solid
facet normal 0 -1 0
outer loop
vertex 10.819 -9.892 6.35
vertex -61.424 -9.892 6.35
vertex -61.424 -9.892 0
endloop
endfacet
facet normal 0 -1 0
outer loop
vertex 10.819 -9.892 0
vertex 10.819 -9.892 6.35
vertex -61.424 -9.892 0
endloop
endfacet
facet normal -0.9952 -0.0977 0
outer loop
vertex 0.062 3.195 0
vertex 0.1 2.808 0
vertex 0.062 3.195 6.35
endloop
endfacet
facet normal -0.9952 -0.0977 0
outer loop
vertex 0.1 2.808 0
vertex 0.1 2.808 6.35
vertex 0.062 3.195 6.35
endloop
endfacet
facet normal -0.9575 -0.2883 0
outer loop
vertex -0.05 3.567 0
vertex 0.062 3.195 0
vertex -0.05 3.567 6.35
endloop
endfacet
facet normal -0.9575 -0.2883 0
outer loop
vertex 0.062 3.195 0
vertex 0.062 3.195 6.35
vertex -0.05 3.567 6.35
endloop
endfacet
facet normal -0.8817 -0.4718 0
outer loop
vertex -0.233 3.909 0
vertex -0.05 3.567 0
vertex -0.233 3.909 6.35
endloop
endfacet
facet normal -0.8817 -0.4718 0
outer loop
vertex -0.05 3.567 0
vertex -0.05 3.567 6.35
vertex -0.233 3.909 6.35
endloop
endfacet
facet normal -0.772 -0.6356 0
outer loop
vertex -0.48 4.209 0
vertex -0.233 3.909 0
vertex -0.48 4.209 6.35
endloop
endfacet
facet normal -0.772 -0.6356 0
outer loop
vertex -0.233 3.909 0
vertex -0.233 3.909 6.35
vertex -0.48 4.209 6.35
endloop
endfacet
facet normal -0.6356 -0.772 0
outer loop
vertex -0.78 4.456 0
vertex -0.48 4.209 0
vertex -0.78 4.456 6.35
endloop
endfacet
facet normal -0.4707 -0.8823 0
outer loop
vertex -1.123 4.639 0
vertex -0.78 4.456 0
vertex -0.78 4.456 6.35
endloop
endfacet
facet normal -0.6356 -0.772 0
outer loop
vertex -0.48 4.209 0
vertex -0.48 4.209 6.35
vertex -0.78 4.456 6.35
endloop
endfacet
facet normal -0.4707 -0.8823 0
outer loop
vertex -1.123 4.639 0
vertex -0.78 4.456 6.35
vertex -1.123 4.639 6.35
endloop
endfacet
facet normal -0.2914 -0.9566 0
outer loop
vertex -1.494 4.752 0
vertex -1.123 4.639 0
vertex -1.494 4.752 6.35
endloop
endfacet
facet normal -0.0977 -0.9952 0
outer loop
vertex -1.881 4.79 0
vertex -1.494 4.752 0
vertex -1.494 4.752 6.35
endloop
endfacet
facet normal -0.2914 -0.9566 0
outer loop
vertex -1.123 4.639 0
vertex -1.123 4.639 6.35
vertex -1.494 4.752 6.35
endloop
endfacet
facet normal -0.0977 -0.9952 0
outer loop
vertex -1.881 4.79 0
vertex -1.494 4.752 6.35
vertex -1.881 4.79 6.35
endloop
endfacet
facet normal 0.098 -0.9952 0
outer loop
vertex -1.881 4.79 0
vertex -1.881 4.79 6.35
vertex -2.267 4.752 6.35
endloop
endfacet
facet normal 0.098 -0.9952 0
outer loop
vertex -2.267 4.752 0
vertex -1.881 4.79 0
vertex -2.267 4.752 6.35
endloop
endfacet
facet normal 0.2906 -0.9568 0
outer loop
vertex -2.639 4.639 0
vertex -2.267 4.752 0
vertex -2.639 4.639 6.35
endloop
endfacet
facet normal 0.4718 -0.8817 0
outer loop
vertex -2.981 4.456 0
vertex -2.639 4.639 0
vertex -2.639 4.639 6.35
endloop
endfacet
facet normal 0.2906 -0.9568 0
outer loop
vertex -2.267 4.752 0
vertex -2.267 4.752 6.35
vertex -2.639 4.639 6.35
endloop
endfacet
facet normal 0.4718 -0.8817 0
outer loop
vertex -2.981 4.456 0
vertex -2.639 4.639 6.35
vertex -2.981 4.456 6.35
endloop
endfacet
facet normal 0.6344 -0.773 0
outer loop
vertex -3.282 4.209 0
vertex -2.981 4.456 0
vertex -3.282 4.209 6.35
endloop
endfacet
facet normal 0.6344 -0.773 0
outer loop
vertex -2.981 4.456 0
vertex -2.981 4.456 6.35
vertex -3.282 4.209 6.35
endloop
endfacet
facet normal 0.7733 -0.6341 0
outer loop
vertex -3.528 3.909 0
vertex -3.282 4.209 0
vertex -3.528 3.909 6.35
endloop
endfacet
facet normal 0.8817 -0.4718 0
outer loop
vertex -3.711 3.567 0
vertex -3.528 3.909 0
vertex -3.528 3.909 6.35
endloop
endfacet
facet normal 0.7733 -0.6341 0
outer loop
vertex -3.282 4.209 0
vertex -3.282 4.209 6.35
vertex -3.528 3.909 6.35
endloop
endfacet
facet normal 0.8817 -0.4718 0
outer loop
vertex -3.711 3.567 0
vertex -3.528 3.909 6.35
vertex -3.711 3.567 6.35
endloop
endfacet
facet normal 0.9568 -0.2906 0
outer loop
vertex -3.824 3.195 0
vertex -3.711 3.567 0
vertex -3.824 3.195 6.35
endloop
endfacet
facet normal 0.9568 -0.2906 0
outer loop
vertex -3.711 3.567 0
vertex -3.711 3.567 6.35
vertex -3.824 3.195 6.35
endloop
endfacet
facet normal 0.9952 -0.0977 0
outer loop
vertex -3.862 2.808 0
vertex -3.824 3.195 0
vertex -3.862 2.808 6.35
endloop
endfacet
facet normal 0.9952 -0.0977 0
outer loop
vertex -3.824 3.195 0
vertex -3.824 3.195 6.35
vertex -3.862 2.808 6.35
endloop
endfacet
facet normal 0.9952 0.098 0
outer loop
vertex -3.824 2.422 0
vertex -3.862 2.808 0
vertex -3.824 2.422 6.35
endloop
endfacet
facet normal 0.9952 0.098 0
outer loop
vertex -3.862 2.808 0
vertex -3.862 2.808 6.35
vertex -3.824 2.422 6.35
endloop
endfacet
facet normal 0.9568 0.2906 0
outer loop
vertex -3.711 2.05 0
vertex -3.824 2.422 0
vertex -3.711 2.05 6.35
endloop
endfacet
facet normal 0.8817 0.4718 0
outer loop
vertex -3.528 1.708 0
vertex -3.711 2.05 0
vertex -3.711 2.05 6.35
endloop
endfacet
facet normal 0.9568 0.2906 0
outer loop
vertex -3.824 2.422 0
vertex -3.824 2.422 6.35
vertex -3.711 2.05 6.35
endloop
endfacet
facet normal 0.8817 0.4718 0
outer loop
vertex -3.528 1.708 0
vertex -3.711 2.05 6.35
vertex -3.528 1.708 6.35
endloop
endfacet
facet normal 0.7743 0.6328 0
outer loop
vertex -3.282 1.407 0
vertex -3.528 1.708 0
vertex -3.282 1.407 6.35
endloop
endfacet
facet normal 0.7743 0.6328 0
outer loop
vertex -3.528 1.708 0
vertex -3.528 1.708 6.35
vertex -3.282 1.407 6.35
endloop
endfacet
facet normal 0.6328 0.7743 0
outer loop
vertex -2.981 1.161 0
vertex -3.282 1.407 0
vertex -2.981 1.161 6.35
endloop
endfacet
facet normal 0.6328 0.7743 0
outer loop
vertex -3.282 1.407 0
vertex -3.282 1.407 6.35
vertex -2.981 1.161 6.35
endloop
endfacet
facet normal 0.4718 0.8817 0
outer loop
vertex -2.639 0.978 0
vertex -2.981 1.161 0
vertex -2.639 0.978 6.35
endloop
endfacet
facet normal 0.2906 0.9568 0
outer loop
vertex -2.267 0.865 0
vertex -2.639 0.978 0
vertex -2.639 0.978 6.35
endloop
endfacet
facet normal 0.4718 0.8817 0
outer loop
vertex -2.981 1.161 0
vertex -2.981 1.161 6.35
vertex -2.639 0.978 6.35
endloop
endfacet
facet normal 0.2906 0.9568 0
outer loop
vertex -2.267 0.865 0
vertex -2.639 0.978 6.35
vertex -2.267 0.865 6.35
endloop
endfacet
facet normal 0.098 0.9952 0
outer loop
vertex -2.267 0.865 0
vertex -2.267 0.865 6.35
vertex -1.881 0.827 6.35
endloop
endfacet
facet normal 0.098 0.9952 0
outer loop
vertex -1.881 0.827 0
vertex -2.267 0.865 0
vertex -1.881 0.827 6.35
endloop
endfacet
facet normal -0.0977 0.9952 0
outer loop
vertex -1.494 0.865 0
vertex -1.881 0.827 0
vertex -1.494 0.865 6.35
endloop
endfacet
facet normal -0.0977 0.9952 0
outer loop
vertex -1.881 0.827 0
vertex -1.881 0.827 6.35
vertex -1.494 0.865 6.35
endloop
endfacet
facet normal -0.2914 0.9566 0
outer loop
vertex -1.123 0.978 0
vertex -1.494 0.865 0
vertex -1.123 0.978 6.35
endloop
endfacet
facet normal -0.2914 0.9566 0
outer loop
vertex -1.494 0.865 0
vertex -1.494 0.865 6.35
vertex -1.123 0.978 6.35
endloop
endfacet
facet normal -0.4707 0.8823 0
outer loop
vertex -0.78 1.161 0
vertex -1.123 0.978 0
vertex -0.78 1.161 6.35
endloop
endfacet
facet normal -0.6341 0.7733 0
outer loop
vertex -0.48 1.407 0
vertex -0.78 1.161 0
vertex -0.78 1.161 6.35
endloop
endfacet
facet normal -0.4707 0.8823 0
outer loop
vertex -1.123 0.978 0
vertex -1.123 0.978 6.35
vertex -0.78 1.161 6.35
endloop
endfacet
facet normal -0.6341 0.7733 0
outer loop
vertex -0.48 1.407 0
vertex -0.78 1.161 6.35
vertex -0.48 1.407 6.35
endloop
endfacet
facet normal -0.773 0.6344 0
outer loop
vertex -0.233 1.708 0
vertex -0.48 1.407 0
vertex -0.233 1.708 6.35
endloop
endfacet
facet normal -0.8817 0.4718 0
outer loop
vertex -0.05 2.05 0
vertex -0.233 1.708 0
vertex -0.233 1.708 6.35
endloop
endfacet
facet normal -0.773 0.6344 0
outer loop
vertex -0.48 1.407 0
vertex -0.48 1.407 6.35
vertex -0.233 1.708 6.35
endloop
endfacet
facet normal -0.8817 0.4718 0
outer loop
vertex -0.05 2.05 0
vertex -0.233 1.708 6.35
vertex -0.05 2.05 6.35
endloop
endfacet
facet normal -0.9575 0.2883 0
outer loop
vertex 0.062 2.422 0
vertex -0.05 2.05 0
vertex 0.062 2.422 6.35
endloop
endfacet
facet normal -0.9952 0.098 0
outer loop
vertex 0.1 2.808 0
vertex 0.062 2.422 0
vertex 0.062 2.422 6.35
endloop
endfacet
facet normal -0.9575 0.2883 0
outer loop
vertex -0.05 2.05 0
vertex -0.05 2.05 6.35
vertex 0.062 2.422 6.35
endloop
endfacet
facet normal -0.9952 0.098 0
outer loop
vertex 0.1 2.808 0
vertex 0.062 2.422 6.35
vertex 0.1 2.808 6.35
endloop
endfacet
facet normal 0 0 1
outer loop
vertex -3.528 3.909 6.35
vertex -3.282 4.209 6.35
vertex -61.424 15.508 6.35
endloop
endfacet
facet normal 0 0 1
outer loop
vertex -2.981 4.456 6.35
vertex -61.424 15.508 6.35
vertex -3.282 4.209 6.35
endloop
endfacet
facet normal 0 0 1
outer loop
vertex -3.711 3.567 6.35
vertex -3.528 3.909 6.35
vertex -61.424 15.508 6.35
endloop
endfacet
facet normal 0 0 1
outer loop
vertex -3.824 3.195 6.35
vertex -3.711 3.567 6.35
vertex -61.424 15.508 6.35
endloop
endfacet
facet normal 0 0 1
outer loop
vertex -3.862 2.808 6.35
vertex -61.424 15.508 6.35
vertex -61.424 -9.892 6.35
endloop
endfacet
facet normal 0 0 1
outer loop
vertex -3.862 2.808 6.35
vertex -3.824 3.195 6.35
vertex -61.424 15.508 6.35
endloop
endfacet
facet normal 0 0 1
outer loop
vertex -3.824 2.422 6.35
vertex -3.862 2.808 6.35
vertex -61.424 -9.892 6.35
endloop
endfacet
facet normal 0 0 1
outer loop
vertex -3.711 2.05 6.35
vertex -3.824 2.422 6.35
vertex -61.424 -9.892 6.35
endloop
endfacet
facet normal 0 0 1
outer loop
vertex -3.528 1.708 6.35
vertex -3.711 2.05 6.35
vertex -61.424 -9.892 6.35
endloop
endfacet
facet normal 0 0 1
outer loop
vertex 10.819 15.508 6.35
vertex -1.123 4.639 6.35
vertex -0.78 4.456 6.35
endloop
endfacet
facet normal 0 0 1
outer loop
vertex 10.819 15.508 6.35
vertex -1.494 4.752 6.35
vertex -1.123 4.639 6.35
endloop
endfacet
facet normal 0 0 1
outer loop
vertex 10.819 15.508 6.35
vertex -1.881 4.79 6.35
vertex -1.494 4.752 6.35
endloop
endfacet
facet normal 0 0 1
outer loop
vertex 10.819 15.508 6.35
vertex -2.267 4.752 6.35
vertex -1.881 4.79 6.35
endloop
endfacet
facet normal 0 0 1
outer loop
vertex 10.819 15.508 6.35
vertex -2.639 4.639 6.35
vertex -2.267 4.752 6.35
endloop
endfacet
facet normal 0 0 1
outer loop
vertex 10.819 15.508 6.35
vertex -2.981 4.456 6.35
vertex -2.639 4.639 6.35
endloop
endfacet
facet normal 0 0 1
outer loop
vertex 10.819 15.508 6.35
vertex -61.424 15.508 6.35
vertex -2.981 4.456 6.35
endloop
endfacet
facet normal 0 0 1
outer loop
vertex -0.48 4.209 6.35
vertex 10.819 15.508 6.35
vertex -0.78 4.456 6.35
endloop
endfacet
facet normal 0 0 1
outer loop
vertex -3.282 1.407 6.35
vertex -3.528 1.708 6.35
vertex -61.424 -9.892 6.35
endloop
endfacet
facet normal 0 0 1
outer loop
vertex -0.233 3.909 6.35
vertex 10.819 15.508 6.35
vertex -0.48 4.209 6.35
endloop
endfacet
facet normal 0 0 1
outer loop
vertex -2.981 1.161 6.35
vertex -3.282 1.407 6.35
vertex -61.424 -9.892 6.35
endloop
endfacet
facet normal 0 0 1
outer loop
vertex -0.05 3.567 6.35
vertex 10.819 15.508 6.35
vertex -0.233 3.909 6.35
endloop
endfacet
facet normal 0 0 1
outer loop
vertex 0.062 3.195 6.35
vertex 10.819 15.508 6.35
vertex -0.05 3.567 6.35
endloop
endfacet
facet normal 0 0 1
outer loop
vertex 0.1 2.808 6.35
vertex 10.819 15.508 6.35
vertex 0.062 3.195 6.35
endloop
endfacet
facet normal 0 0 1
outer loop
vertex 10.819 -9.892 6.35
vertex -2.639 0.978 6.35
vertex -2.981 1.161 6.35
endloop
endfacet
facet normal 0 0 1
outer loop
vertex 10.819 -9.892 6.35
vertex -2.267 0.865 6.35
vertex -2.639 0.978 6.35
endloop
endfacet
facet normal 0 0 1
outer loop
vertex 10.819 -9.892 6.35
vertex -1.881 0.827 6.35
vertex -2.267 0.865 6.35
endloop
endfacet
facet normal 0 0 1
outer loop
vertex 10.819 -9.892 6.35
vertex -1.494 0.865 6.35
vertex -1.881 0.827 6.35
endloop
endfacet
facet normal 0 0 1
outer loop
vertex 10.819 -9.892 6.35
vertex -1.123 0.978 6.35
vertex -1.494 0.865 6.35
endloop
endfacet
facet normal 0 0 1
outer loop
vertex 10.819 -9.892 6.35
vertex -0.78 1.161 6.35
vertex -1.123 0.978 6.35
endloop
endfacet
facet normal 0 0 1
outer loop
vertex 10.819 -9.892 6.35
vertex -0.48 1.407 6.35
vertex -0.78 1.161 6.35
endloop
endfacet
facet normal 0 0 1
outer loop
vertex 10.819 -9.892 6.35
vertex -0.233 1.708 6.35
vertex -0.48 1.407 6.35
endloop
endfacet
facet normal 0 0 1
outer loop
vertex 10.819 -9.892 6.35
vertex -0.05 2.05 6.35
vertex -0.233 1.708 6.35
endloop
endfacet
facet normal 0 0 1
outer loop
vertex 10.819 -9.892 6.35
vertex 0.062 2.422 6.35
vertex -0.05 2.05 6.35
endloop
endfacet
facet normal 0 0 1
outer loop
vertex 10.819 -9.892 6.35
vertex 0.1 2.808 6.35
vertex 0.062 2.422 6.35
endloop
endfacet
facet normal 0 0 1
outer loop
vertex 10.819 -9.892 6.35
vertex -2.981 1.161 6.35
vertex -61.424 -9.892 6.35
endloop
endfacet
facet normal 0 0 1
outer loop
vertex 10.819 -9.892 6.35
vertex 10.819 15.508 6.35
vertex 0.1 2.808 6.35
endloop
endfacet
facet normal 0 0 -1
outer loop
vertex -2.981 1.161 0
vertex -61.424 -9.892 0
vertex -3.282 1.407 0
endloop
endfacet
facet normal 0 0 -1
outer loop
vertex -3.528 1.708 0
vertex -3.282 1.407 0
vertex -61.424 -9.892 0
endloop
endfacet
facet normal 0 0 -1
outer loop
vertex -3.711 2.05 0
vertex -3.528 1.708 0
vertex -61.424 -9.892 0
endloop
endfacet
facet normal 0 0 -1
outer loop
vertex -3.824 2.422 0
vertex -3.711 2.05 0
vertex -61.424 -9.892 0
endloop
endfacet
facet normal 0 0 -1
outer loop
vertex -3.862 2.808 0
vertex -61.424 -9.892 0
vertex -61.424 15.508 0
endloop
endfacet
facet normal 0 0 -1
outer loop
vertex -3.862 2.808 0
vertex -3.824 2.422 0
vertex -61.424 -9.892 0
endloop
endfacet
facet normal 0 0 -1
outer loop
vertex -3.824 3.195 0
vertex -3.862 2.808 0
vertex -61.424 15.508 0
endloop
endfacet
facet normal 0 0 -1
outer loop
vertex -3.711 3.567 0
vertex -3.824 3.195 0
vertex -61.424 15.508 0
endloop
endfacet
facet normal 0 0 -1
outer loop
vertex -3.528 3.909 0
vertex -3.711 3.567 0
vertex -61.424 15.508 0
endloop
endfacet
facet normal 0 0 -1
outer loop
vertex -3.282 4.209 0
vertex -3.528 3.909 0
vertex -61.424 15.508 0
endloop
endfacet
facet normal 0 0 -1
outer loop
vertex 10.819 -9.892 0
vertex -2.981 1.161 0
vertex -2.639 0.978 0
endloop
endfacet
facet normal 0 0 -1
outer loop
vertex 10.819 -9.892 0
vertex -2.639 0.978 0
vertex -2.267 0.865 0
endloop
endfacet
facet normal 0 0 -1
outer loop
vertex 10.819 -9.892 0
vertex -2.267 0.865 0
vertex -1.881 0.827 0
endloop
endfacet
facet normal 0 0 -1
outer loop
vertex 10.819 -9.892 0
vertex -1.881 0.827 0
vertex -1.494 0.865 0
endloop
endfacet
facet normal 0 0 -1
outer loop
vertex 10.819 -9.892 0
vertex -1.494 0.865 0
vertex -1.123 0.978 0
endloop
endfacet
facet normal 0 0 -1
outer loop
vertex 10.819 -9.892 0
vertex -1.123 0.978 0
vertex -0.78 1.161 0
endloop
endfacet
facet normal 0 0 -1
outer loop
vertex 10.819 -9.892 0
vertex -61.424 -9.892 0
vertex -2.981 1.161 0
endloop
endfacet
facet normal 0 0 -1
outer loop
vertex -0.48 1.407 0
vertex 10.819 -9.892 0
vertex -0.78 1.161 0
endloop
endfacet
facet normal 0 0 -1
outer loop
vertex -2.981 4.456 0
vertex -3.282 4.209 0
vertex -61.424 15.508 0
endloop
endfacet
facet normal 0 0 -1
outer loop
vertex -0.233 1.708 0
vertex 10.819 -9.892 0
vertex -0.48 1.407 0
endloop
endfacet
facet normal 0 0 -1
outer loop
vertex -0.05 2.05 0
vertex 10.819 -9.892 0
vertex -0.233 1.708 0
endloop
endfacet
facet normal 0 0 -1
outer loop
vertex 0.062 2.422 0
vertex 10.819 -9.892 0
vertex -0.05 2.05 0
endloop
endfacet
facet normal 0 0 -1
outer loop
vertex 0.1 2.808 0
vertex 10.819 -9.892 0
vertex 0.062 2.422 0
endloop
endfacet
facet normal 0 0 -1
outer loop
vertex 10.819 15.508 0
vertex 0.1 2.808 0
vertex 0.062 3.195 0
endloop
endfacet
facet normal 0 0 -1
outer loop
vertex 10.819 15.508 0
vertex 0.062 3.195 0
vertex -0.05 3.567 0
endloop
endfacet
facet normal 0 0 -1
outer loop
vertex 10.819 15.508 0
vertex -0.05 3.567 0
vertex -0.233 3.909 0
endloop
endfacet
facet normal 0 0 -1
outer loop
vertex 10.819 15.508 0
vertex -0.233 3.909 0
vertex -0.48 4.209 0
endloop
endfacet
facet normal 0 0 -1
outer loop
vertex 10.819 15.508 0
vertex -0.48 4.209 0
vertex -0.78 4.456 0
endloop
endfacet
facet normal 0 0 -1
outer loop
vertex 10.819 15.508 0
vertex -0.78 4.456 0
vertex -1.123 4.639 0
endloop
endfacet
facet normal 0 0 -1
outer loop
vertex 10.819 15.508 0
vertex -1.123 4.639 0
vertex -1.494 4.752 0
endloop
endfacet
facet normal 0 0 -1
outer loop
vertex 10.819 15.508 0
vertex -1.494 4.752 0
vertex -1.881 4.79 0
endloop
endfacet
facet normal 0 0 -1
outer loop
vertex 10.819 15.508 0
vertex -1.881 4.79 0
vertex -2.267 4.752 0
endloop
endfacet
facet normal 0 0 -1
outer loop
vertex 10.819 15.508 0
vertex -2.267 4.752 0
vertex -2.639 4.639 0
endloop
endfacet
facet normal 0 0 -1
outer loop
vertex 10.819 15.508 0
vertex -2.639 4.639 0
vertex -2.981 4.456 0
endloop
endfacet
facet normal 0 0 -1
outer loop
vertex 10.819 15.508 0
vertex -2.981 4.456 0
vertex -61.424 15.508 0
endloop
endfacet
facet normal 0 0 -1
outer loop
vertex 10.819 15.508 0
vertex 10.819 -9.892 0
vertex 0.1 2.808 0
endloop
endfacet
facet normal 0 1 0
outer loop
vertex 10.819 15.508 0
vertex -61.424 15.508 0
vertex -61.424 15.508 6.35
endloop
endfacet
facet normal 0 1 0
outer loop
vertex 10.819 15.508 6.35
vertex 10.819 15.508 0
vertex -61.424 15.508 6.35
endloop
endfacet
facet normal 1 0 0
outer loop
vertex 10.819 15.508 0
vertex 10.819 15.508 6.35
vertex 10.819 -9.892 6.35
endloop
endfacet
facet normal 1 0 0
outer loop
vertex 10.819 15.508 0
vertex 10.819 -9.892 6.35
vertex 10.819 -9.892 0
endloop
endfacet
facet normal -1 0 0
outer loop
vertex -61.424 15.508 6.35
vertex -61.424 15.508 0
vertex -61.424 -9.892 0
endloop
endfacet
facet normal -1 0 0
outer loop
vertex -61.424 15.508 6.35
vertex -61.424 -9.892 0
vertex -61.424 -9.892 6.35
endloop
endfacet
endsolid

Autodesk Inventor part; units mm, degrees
ref_plane "YZ Plane" through (0, 0, 0) normal (1, 0, 0) x (0, 1, 0)
ref_plane "XZ Plane" through (0, 0, 0) normal (0, 1, 0) x (-1, 0, 0)
ref_plane "XY Plane" through (0, 0, 0) normal (0, 0, 1) x (1, 0, 0)
sketch "Sketch1" plane through (0, 0, 0) normal (0, 0, 1) x (1, 0, 0)
  line L0 (-53.9057, 15.5084) -> (-1.8807, 15.5084)
  line L1 (-1.8807, 15.5084) -> (-1.8807, -9.8916)
  line L2 (-1.8807, -9.8916) -> (-53.9057, -9.8916)
  line L3 (-53.9057, -9.8916) -> (-53.9057, 15.5084)
  point P0 (0, 0)
  dimension "d0" = 52.025
  dimension "d1" = 25.4
extrude "Extrusion1" add sketch "Sketch1" along normal blind 6.35
sketch "Sketch2" plane through (-1.8807, -9.8916, 0) normal (1, 0, 0) x (0, 0, -1)
  line L0 (-6.35, 25.4) -> (-6.35, 0) projected
  line L1 (0, 0) -> (-6.35, 0) projected
  line L2 (0, 25.4) -> (0, 0) projected
  line L3 (0, 25.4) -> (-6.35, 25.4) projected
  point P0 (0, 9.8916)
extrude "Extrusion2" add sketch "Sketch2" along normal blind 12.7
sketch "Sketch3" plane through (0, 0, 6.35) normal (0, 0, 1) x (1, 0, 0)
  line L0 (10.8193, -9.8916) -> (10.8193, 15.5084) projected
  line L1 (10.8193, -9.8916) -> (10.8193, 2.8084)
  line L2 (10.8193, 2.8084) -> (-1.8807, 2.8084)
  circle A0 centre (-1.8807, 2.8084) radius 1.9812
  point P0 (0, 0)
  dimension "d6" = 12.7
  dimension "d7" = 3.9624
extrude "Extrusion3" cut sketch "Sketch3" against normal blind 12.7
sketch "Sketch4" plane through (-53.9057, -9.8916, 0) normal (-1, 0, 0) x (0, 0, 1)
  line L0 (6.35, 0) -> (6.35, 25.4) projected
  line L1 (0, 25.4) -> (6.35, 25.4) projected
  line L2 (0, 0) -> (0, 25.4) projected
  line L3 (0, 0) -> (6.35, 0) projected
  point P0 (0, 9.8916)
extrude "Extrusion4" add sketch "Sketch4" along normal blind 6.35
sketch "Sketch5" plane through (-60.2557, -9.8916, 0) normal (-1, 0, 0) x (0, 0, 1)
  line L0 (6.35, 0) -> (0, 0) projected
  line L1 (6.35, 25.4) -> (6.35, 0) projected
  line L2 (0, 25.4) -> (6.35, 25.4) projected
  line L3 (0, 0) -> (0, 25.4) projected
  point P0 (0, 9.8916)
extrude "Extrusion5" add sketch "Sketch5" along normal blind 1.1684
properties part number "hconnector2"
